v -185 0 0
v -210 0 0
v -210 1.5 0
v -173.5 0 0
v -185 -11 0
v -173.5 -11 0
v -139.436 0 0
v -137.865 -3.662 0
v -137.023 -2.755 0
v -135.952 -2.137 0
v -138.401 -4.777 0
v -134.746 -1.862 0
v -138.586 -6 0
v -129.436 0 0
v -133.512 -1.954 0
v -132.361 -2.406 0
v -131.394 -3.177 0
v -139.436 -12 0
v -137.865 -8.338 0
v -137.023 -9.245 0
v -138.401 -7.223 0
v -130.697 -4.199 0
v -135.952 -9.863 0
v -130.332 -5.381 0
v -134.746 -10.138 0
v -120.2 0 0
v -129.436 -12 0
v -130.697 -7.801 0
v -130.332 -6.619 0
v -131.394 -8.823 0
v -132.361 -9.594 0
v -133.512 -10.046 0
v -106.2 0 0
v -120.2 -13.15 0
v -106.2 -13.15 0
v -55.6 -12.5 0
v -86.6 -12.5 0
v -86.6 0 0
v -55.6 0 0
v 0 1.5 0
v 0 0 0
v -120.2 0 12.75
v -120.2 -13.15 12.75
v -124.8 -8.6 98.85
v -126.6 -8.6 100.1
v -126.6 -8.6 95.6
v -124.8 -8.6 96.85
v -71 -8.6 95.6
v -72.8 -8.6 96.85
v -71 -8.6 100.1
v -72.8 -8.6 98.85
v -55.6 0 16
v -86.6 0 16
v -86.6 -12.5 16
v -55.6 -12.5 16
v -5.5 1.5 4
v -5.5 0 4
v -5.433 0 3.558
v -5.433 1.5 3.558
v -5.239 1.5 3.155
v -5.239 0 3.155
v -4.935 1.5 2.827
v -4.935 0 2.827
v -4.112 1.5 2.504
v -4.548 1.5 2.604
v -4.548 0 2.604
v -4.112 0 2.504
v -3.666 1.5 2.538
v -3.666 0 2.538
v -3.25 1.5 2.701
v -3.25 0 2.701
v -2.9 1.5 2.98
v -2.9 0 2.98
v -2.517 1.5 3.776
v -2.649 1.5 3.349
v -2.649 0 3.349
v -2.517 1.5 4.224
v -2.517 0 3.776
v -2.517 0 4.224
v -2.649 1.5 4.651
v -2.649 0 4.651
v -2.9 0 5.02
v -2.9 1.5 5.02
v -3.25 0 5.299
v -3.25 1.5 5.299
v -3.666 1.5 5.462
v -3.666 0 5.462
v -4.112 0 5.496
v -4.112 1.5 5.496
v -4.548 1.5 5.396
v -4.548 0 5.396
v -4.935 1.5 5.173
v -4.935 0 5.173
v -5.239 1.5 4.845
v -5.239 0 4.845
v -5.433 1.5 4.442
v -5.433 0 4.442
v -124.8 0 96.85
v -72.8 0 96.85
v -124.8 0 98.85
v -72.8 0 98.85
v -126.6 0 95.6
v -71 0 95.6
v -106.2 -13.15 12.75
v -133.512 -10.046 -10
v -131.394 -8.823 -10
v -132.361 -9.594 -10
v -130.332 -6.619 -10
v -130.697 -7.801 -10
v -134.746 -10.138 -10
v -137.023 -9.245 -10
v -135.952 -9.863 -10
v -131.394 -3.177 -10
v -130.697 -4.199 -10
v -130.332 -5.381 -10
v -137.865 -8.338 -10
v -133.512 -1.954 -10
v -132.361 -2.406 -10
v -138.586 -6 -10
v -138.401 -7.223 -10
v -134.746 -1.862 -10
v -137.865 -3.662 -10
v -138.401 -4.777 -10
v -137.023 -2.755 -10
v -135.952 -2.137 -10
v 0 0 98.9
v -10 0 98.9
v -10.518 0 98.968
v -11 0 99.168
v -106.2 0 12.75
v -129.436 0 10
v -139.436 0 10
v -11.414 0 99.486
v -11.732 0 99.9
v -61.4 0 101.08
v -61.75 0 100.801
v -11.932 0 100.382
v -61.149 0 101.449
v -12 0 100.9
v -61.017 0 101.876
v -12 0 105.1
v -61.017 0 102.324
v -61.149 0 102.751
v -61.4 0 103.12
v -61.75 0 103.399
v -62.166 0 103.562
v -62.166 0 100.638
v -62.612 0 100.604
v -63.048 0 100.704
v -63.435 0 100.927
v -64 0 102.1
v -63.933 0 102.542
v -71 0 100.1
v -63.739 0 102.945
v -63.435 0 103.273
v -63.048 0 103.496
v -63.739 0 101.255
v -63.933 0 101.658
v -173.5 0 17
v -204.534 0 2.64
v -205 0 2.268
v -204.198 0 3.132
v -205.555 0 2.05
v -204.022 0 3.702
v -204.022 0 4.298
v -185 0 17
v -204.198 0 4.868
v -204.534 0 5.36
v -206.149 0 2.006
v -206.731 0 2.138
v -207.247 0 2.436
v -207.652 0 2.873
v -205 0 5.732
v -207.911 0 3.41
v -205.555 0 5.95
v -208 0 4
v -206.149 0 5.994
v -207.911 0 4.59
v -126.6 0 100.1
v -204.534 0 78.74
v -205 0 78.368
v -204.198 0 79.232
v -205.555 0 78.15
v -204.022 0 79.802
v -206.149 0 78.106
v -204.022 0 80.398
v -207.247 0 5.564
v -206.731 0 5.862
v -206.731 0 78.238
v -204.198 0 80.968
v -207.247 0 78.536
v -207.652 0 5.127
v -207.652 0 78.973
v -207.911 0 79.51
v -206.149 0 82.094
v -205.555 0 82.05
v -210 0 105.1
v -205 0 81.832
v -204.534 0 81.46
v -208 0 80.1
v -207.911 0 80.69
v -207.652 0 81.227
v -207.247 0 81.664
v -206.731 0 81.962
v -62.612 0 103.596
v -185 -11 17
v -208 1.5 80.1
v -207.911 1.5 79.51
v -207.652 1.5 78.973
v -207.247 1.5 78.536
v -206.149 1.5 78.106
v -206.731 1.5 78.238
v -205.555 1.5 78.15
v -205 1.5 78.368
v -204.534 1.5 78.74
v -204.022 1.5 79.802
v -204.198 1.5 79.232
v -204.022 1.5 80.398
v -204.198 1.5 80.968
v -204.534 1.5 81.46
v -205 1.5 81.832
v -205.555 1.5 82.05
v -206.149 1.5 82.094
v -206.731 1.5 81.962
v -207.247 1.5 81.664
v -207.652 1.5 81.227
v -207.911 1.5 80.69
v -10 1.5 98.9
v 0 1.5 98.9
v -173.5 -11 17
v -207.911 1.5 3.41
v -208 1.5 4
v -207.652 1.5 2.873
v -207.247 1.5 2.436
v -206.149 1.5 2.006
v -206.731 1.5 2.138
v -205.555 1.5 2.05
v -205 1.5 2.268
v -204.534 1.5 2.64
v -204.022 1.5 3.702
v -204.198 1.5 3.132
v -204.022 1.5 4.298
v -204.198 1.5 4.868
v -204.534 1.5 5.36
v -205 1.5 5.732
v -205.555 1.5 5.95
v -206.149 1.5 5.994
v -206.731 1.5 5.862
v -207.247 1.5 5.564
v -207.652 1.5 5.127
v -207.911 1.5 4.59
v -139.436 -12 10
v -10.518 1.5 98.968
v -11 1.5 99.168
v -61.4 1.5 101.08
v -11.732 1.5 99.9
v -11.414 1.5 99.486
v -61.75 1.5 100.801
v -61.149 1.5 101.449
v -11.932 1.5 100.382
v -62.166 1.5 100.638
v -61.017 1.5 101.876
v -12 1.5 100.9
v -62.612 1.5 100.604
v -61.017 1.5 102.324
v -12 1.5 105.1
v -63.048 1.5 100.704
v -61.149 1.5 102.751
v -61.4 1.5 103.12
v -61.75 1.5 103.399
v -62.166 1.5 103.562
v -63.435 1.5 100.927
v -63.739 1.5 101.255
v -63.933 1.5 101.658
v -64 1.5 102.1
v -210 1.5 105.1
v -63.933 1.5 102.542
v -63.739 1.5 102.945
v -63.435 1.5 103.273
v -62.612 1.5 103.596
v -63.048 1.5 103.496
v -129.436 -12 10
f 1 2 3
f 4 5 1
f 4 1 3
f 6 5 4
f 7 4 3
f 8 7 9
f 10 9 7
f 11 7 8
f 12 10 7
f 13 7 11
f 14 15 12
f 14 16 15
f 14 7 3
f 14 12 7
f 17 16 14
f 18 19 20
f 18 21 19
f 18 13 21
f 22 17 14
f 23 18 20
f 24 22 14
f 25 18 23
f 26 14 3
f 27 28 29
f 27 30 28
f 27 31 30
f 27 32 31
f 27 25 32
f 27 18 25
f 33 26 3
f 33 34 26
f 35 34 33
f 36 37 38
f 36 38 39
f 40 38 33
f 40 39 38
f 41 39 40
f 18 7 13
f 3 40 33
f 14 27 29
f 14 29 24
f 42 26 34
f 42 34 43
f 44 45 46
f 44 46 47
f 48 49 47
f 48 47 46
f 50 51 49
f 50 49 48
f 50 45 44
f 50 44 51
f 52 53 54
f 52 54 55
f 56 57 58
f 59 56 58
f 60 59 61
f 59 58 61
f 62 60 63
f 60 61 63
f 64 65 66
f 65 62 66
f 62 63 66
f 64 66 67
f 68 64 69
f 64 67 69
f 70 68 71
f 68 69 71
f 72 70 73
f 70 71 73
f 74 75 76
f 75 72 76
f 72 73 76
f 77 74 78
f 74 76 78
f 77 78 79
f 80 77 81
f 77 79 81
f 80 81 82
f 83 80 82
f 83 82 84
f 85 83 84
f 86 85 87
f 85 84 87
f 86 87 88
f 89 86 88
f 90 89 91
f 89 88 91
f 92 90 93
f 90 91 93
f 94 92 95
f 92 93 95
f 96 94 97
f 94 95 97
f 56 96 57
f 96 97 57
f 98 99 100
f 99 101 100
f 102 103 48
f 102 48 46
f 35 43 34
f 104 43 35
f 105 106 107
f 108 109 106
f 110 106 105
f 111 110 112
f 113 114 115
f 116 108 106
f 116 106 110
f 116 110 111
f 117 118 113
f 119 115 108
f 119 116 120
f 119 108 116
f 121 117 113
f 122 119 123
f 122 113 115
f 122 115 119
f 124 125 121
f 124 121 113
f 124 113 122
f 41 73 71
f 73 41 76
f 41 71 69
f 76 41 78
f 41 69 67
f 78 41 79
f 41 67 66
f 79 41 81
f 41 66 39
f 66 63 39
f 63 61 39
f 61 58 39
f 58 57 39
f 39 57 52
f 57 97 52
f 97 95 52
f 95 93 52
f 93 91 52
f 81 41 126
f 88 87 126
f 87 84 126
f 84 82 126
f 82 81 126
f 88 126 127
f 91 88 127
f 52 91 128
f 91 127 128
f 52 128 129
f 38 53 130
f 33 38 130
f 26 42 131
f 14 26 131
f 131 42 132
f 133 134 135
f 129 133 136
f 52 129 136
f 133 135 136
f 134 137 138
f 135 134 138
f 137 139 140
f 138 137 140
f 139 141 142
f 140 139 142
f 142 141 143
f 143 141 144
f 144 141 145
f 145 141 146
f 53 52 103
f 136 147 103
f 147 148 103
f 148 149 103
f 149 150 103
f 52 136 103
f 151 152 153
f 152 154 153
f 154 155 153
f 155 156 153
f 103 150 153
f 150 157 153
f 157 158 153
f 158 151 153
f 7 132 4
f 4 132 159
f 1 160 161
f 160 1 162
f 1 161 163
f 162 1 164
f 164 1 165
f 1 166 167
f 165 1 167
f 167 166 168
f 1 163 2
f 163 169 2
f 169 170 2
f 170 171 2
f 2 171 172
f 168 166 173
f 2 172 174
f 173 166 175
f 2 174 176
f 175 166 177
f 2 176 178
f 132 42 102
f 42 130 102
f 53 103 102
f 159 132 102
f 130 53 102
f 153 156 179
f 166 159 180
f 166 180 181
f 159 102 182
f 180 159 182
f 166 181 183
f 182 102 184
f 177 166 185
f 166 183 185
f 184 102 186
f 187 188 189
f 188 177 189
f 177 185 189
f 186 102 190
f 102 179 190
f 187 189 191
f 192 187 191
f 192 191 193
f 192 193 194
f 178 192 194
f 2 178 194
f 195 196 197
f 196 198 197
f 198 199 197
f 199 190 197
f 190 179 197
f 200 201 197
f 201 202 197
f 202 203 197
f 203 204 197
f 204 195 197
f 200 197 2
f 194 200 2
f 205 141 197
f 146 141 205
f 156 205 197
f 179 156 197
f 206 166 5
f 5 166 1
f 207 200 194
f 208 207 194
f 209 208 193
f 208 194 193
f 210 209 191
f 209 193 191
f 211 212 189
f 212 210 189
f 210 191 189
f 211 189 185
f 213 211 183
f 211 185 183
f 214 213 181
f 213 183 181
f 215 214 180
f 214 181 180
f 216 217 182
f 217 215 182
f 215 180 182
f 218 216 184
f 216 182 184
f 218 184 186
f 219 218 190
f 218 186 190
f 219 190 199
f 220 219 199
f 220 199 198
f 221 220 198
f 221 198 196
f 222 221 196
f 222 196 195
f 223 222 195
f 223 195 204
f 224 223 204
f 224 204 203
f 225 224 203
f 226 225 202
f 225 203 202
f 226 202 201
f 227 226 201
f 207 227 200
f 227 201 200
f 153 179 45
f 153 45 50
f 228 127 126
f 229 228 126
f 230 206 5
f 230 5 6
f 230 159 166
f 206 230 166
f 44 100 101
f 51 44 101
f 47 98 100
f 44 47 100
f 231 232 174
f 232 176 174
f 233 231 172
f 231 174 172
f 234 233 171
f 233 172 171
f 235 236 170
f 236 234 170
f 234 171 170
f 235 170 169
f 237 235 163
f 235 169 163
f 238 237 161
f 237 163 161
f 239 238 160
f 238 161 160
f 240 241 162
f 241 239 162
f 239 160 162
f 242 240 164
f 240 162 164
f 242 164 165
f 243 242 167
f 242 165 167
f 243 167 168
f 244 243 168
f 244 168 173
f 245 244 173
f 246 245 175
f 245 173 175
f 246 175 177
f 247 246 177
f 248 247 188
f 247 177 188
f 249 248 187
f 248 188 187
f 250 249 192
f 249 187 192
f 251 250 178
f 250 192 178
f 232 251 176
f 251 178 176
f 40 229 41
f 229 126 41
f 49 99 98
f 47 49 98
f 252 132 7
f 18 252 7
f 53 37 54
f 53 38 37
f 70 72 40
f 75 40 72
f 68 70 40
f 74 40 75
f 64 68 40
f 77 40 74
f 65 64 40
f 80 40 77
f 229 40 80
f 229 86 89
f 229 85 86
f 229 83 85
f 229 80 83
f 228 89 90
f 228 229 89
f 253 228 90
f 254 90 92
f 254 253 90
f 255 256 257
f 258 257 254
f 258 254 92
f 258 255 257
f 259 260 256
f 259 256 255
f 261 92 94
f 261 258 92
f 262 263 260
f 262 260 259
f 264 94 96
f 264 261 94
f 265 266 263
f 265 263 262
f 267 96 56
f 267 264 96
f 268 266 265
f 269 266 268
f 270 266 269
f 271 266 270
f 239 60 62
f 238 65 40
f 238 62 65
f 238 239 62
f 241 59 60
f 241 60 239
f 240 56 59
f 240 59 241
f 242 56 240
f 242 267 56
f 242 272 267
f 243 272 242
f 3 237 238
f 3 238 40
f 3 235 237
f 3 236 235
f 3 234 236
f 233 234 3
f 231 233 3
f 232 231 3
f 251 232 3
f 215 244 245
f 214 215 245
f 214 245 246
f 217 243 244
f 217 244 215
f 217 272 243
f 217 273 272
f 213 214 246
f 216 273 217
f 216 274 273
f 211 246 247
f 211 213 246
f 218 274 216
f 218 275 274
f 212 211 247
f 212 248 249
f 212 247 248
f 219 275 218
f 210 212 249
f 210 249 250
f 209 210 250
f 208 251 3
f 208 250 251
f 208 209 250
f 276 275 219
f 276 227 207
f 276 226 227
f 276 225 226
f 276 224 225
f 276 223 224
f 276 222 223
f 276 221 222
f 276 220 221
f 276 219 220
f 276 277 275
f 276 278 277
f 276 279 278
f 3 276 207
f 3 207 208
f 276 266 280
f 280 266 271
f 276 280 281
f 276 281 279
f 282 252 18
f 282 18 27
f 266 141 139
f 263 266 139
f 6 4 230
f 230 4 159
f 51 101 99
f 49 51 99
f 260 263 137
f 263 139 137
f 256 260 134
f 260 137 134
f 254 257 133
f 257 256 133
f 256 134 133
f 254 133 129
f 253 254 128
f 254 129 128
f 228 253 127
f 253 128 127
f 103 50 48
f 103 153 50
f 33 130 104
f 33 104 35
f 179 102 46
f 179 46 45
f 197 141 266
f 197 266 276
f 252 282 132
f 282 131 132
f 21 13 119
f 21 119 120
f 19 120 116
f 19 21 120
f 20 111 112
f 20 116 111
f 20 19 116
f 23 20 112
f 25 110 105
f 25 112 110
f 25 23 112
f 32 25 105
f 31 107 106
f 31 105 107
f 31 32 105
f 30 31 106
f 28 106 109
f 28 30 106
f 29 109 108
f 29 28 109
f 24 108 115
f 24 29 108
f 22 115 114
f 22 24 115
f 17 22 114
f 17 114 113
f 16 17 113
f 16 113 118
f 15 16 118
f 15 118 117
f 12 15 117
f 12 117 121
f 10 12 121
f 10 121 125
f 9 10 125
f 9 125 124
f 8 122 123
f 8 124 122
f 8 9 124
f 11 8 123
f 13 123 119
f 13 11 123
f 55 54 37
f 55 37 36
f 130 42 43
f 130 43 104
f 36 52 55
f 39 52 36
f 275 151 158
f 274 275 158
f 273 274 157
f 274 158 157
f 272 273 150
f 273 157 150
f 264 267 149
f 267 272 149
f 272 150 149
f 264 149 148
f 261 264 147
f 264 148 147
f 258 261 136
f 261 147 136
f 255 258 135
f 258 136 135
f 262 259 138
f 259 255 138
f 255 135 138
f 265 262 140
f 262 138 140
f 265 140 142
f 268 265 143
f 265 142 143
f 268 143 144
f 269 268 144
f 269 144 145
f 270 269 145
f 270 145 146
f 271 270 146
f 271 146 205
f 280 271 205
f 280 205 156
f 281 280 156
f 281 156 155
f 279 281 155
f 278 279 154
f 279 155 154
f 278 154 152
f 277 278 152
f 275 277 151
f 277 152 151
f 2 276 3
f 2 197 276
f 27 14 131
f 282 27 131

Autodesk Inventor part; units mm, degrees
ref_plane "YZ Plane" through (0, 0, 0) normal (1, 0, 0) x (0, 1, 0)
ref_plane "XZ Plane" through (0, 0, 0) normal (0, 1, 0) x (-1, 0, 0)
ref_plane "XY Plane" through (0, 0, 0) normal (0, 0, 1) x (1, 0, 0)
sketch "Sketch1" plane through (0, 0, 0) normal (0, 1, 0) x (-1, 0, 0)
  line L0 (12, 105.1) -> (210, 105.1)
  line L1 (210, 105.1) -> (210, 0)
  line L2 (210, 0) -> (0, 0)
  circle A0 centre (4, 4) radius 1.5
  circle A1 centre (206, 4) radius 2
  circle A2 centre (206, 80.1) radius 2
  circle A3 centre (62.5, 102.1) radius 1.5
  line L3 (12, 105.1) -> (12, 100.9)
  line L4 (10, 98.9) -> (0, 98.9)
  arc A4 (10, 98.9) -> (12, 100.9) centre (10, 100.9) ccw
  line L5 (0, 98.9) -> (0, 0)
  point P0 (12, 98.9)
  dimension "d1" = 210
  dimension "d6" = 3
  dimension "d7" = 4
  dimension "d9" = 4
  dimension "d12" = 3
  dimension "d13" = 3
  dimension "d14" = 12
  dimension "d15" = 6.2
  dimension "d16" = 2
  dimension "d52" = 105.1
  dimension "d53" = 4
  dimension "d54" = 4
  dimension "d55" = 62.5
  dimension "d56" = 206
  dimension "d57" = 80.1
  dimension "d58" = 4
extrude "Extrusion1" add sketch "Sketch1" along normal blind 1.5
sketch "Sketch2" plane through (0, 0, 0) normal (0, -1, 0) x (1, 0, 0)
  line L0 (-126.6, 100.1) -> (-71, 100.1)
  line L1 (-71, 100.1) -> (-71, 95.6)
  line L2 (-71, 95.6) -> (-126.6, 95.6)
  line L3 (-126.6, 95.6) -> (-126.6, 100.1)
  line L4 (-210, 0) -> (-210, 105.1) projected
  line L5 (0, 98.9) -> (0, 0) projected
  line L6 (-72.8, 96.85) -> (-124.8, 96.85)
  line L7 (-124.8, 96.85) -> (-124.8, 98.85)
  line L8 (-124.8, 98.85) -> (-72.8, 98.85)
  line L9 (-72.8, 98.85) -> (-72.8, 96.85)
  line L10 (-210, 105.1) -> (-12, 105.1) projected
  point P0 (-126.6, 97.85)
  point P1 (-72.8, 97.85)
  point P2 (-71, 97.85)
  point P3 (-98.8, 98.85)
  point P4 (-98.8, 100.1)
  point P5 (-111, 105.1)
  dimension "d17" = 4.5
  dimension "d18" = 55.6
  dimension "d34" = 2
  dimension "d35" = 71
  dimension "d36" = 5
  dimension "d59" = 1.8
sketch "Sketch3" plane through (0, 0, 0) normal (0, -1, 0) x (1, 0, 0)
  line L0 (0, 0) -> (-210, 0) projected
  line L1 (-55.6, 0) -> (-86.6, 0)
  line L2 (-86.6, 0) -> (-86.6, 16)
  line L3 (-86.6, 16) -> (-55.6, 16)
  line L4 (-55.6, 16) -> (-55.6, 0)
  line L5 (0, 98.9) -> (0, 0) projected
  point P0 (-55.6, 8)
  point P1 (-86.6, 0)
  dimension "d23" = 55.6
  dimension "d24" = 31
  dimension "d25" = 16
extrude "Extrusion3" add sketch "Sketch3" along normal blind 12.5
sketch "Sketch4" plane through (0, 0, 0) normal (0, -1, 0) x (1, 0, 0)
  line L0 (-106.2, 0) -> (-120.2, 0)
  line L1 (-120.2, 0) -> (-120.2, 12.75)
  line L2 (-120.2, 12.75) -> (-106.2, 12.75)
  line L3 (-106.2, 12.75) -> (-106.2, 0)
  line L4 (-86.6, 16) -> (-86.6, 0) projected
  line L5 (0, 0) -> (-55.6, 0) projected
  line L6 (-86.6, 0) -> (-210, 0) projected
  dimension "d28" = 12.75
  dimension "d29" = 14
  dimension "d32" = 19.6
extrude "Extrusion4" add sketch "Sketch4" along normal blind 13.15
extrude "Extrusion5" add sketch "Sketch2" along normal blind 8.6
sketch "Sketch5" plane through (0, 0, 0) normal (0, -1, 0) x (1, 0, 0)
  line L0 (0, 0) -> (-210, 0) projected
  line L1 (-185, 0) -> (-173.5, 0)
  line L2 (-173.5, 0) -> (-173.5, 17)
  line L3 (-173.5, 17) -> (-185, 17)
  line L4 (-185, 17) -> (-185, 0)
  line L5 (-210, 0) -> (-210, 105.1) projected
  point P0 (-173.5, 0)
  dimension "d39" = 17
  dimension "d40" = 11.5
  dimension "d43" = 25
extrude "Extrusion6" add sketch "Sketch5" along normal blind 11
sketch "Sketch6" plane through (0, 0, 0) normal (0, -1, 0) x (1, 0, 0)
  line L0 (0, 0) -> (-210, 0) projected
  line L1 (-139.4357, 0) -> (-129.4357, 0)
  line L2 (-129.4357, 0) -> (-129.4357, 10)
  line L3 (-129.4357, 10) -> (-139.4357, 10)
  line L4 (-139.4357, 10) -> (-139.4357, 0)
  point P0 (-129.4357, 0)
  dimension "d44" = 10
  dimension "d45" = 10
extrude "Extrusion7" add sketch "Sketch6" along normal blind 12
sketch "Sketch7" plane through (0, 1.5, 0) normal (0, 0, -1) x (-1, 0, 0)
  circle A0 centre (134.4357, -7.5) radius 4.15
  line L0 (139.4357, -1.5) -> (139.4357, -13.5) projected
  line L1 (139.4357, -13.5) -> (129.4357, -13.5) projected
  point P0 (0, -1.5)
  point P1 (139.4357, -7.5)
  point P2 (134.4357, -13.5)
  dimension "d48" = 8.3
extrude "Extrusion8" add sketch "Sketch7" along normal blind 10
properties part number "motherboard"
